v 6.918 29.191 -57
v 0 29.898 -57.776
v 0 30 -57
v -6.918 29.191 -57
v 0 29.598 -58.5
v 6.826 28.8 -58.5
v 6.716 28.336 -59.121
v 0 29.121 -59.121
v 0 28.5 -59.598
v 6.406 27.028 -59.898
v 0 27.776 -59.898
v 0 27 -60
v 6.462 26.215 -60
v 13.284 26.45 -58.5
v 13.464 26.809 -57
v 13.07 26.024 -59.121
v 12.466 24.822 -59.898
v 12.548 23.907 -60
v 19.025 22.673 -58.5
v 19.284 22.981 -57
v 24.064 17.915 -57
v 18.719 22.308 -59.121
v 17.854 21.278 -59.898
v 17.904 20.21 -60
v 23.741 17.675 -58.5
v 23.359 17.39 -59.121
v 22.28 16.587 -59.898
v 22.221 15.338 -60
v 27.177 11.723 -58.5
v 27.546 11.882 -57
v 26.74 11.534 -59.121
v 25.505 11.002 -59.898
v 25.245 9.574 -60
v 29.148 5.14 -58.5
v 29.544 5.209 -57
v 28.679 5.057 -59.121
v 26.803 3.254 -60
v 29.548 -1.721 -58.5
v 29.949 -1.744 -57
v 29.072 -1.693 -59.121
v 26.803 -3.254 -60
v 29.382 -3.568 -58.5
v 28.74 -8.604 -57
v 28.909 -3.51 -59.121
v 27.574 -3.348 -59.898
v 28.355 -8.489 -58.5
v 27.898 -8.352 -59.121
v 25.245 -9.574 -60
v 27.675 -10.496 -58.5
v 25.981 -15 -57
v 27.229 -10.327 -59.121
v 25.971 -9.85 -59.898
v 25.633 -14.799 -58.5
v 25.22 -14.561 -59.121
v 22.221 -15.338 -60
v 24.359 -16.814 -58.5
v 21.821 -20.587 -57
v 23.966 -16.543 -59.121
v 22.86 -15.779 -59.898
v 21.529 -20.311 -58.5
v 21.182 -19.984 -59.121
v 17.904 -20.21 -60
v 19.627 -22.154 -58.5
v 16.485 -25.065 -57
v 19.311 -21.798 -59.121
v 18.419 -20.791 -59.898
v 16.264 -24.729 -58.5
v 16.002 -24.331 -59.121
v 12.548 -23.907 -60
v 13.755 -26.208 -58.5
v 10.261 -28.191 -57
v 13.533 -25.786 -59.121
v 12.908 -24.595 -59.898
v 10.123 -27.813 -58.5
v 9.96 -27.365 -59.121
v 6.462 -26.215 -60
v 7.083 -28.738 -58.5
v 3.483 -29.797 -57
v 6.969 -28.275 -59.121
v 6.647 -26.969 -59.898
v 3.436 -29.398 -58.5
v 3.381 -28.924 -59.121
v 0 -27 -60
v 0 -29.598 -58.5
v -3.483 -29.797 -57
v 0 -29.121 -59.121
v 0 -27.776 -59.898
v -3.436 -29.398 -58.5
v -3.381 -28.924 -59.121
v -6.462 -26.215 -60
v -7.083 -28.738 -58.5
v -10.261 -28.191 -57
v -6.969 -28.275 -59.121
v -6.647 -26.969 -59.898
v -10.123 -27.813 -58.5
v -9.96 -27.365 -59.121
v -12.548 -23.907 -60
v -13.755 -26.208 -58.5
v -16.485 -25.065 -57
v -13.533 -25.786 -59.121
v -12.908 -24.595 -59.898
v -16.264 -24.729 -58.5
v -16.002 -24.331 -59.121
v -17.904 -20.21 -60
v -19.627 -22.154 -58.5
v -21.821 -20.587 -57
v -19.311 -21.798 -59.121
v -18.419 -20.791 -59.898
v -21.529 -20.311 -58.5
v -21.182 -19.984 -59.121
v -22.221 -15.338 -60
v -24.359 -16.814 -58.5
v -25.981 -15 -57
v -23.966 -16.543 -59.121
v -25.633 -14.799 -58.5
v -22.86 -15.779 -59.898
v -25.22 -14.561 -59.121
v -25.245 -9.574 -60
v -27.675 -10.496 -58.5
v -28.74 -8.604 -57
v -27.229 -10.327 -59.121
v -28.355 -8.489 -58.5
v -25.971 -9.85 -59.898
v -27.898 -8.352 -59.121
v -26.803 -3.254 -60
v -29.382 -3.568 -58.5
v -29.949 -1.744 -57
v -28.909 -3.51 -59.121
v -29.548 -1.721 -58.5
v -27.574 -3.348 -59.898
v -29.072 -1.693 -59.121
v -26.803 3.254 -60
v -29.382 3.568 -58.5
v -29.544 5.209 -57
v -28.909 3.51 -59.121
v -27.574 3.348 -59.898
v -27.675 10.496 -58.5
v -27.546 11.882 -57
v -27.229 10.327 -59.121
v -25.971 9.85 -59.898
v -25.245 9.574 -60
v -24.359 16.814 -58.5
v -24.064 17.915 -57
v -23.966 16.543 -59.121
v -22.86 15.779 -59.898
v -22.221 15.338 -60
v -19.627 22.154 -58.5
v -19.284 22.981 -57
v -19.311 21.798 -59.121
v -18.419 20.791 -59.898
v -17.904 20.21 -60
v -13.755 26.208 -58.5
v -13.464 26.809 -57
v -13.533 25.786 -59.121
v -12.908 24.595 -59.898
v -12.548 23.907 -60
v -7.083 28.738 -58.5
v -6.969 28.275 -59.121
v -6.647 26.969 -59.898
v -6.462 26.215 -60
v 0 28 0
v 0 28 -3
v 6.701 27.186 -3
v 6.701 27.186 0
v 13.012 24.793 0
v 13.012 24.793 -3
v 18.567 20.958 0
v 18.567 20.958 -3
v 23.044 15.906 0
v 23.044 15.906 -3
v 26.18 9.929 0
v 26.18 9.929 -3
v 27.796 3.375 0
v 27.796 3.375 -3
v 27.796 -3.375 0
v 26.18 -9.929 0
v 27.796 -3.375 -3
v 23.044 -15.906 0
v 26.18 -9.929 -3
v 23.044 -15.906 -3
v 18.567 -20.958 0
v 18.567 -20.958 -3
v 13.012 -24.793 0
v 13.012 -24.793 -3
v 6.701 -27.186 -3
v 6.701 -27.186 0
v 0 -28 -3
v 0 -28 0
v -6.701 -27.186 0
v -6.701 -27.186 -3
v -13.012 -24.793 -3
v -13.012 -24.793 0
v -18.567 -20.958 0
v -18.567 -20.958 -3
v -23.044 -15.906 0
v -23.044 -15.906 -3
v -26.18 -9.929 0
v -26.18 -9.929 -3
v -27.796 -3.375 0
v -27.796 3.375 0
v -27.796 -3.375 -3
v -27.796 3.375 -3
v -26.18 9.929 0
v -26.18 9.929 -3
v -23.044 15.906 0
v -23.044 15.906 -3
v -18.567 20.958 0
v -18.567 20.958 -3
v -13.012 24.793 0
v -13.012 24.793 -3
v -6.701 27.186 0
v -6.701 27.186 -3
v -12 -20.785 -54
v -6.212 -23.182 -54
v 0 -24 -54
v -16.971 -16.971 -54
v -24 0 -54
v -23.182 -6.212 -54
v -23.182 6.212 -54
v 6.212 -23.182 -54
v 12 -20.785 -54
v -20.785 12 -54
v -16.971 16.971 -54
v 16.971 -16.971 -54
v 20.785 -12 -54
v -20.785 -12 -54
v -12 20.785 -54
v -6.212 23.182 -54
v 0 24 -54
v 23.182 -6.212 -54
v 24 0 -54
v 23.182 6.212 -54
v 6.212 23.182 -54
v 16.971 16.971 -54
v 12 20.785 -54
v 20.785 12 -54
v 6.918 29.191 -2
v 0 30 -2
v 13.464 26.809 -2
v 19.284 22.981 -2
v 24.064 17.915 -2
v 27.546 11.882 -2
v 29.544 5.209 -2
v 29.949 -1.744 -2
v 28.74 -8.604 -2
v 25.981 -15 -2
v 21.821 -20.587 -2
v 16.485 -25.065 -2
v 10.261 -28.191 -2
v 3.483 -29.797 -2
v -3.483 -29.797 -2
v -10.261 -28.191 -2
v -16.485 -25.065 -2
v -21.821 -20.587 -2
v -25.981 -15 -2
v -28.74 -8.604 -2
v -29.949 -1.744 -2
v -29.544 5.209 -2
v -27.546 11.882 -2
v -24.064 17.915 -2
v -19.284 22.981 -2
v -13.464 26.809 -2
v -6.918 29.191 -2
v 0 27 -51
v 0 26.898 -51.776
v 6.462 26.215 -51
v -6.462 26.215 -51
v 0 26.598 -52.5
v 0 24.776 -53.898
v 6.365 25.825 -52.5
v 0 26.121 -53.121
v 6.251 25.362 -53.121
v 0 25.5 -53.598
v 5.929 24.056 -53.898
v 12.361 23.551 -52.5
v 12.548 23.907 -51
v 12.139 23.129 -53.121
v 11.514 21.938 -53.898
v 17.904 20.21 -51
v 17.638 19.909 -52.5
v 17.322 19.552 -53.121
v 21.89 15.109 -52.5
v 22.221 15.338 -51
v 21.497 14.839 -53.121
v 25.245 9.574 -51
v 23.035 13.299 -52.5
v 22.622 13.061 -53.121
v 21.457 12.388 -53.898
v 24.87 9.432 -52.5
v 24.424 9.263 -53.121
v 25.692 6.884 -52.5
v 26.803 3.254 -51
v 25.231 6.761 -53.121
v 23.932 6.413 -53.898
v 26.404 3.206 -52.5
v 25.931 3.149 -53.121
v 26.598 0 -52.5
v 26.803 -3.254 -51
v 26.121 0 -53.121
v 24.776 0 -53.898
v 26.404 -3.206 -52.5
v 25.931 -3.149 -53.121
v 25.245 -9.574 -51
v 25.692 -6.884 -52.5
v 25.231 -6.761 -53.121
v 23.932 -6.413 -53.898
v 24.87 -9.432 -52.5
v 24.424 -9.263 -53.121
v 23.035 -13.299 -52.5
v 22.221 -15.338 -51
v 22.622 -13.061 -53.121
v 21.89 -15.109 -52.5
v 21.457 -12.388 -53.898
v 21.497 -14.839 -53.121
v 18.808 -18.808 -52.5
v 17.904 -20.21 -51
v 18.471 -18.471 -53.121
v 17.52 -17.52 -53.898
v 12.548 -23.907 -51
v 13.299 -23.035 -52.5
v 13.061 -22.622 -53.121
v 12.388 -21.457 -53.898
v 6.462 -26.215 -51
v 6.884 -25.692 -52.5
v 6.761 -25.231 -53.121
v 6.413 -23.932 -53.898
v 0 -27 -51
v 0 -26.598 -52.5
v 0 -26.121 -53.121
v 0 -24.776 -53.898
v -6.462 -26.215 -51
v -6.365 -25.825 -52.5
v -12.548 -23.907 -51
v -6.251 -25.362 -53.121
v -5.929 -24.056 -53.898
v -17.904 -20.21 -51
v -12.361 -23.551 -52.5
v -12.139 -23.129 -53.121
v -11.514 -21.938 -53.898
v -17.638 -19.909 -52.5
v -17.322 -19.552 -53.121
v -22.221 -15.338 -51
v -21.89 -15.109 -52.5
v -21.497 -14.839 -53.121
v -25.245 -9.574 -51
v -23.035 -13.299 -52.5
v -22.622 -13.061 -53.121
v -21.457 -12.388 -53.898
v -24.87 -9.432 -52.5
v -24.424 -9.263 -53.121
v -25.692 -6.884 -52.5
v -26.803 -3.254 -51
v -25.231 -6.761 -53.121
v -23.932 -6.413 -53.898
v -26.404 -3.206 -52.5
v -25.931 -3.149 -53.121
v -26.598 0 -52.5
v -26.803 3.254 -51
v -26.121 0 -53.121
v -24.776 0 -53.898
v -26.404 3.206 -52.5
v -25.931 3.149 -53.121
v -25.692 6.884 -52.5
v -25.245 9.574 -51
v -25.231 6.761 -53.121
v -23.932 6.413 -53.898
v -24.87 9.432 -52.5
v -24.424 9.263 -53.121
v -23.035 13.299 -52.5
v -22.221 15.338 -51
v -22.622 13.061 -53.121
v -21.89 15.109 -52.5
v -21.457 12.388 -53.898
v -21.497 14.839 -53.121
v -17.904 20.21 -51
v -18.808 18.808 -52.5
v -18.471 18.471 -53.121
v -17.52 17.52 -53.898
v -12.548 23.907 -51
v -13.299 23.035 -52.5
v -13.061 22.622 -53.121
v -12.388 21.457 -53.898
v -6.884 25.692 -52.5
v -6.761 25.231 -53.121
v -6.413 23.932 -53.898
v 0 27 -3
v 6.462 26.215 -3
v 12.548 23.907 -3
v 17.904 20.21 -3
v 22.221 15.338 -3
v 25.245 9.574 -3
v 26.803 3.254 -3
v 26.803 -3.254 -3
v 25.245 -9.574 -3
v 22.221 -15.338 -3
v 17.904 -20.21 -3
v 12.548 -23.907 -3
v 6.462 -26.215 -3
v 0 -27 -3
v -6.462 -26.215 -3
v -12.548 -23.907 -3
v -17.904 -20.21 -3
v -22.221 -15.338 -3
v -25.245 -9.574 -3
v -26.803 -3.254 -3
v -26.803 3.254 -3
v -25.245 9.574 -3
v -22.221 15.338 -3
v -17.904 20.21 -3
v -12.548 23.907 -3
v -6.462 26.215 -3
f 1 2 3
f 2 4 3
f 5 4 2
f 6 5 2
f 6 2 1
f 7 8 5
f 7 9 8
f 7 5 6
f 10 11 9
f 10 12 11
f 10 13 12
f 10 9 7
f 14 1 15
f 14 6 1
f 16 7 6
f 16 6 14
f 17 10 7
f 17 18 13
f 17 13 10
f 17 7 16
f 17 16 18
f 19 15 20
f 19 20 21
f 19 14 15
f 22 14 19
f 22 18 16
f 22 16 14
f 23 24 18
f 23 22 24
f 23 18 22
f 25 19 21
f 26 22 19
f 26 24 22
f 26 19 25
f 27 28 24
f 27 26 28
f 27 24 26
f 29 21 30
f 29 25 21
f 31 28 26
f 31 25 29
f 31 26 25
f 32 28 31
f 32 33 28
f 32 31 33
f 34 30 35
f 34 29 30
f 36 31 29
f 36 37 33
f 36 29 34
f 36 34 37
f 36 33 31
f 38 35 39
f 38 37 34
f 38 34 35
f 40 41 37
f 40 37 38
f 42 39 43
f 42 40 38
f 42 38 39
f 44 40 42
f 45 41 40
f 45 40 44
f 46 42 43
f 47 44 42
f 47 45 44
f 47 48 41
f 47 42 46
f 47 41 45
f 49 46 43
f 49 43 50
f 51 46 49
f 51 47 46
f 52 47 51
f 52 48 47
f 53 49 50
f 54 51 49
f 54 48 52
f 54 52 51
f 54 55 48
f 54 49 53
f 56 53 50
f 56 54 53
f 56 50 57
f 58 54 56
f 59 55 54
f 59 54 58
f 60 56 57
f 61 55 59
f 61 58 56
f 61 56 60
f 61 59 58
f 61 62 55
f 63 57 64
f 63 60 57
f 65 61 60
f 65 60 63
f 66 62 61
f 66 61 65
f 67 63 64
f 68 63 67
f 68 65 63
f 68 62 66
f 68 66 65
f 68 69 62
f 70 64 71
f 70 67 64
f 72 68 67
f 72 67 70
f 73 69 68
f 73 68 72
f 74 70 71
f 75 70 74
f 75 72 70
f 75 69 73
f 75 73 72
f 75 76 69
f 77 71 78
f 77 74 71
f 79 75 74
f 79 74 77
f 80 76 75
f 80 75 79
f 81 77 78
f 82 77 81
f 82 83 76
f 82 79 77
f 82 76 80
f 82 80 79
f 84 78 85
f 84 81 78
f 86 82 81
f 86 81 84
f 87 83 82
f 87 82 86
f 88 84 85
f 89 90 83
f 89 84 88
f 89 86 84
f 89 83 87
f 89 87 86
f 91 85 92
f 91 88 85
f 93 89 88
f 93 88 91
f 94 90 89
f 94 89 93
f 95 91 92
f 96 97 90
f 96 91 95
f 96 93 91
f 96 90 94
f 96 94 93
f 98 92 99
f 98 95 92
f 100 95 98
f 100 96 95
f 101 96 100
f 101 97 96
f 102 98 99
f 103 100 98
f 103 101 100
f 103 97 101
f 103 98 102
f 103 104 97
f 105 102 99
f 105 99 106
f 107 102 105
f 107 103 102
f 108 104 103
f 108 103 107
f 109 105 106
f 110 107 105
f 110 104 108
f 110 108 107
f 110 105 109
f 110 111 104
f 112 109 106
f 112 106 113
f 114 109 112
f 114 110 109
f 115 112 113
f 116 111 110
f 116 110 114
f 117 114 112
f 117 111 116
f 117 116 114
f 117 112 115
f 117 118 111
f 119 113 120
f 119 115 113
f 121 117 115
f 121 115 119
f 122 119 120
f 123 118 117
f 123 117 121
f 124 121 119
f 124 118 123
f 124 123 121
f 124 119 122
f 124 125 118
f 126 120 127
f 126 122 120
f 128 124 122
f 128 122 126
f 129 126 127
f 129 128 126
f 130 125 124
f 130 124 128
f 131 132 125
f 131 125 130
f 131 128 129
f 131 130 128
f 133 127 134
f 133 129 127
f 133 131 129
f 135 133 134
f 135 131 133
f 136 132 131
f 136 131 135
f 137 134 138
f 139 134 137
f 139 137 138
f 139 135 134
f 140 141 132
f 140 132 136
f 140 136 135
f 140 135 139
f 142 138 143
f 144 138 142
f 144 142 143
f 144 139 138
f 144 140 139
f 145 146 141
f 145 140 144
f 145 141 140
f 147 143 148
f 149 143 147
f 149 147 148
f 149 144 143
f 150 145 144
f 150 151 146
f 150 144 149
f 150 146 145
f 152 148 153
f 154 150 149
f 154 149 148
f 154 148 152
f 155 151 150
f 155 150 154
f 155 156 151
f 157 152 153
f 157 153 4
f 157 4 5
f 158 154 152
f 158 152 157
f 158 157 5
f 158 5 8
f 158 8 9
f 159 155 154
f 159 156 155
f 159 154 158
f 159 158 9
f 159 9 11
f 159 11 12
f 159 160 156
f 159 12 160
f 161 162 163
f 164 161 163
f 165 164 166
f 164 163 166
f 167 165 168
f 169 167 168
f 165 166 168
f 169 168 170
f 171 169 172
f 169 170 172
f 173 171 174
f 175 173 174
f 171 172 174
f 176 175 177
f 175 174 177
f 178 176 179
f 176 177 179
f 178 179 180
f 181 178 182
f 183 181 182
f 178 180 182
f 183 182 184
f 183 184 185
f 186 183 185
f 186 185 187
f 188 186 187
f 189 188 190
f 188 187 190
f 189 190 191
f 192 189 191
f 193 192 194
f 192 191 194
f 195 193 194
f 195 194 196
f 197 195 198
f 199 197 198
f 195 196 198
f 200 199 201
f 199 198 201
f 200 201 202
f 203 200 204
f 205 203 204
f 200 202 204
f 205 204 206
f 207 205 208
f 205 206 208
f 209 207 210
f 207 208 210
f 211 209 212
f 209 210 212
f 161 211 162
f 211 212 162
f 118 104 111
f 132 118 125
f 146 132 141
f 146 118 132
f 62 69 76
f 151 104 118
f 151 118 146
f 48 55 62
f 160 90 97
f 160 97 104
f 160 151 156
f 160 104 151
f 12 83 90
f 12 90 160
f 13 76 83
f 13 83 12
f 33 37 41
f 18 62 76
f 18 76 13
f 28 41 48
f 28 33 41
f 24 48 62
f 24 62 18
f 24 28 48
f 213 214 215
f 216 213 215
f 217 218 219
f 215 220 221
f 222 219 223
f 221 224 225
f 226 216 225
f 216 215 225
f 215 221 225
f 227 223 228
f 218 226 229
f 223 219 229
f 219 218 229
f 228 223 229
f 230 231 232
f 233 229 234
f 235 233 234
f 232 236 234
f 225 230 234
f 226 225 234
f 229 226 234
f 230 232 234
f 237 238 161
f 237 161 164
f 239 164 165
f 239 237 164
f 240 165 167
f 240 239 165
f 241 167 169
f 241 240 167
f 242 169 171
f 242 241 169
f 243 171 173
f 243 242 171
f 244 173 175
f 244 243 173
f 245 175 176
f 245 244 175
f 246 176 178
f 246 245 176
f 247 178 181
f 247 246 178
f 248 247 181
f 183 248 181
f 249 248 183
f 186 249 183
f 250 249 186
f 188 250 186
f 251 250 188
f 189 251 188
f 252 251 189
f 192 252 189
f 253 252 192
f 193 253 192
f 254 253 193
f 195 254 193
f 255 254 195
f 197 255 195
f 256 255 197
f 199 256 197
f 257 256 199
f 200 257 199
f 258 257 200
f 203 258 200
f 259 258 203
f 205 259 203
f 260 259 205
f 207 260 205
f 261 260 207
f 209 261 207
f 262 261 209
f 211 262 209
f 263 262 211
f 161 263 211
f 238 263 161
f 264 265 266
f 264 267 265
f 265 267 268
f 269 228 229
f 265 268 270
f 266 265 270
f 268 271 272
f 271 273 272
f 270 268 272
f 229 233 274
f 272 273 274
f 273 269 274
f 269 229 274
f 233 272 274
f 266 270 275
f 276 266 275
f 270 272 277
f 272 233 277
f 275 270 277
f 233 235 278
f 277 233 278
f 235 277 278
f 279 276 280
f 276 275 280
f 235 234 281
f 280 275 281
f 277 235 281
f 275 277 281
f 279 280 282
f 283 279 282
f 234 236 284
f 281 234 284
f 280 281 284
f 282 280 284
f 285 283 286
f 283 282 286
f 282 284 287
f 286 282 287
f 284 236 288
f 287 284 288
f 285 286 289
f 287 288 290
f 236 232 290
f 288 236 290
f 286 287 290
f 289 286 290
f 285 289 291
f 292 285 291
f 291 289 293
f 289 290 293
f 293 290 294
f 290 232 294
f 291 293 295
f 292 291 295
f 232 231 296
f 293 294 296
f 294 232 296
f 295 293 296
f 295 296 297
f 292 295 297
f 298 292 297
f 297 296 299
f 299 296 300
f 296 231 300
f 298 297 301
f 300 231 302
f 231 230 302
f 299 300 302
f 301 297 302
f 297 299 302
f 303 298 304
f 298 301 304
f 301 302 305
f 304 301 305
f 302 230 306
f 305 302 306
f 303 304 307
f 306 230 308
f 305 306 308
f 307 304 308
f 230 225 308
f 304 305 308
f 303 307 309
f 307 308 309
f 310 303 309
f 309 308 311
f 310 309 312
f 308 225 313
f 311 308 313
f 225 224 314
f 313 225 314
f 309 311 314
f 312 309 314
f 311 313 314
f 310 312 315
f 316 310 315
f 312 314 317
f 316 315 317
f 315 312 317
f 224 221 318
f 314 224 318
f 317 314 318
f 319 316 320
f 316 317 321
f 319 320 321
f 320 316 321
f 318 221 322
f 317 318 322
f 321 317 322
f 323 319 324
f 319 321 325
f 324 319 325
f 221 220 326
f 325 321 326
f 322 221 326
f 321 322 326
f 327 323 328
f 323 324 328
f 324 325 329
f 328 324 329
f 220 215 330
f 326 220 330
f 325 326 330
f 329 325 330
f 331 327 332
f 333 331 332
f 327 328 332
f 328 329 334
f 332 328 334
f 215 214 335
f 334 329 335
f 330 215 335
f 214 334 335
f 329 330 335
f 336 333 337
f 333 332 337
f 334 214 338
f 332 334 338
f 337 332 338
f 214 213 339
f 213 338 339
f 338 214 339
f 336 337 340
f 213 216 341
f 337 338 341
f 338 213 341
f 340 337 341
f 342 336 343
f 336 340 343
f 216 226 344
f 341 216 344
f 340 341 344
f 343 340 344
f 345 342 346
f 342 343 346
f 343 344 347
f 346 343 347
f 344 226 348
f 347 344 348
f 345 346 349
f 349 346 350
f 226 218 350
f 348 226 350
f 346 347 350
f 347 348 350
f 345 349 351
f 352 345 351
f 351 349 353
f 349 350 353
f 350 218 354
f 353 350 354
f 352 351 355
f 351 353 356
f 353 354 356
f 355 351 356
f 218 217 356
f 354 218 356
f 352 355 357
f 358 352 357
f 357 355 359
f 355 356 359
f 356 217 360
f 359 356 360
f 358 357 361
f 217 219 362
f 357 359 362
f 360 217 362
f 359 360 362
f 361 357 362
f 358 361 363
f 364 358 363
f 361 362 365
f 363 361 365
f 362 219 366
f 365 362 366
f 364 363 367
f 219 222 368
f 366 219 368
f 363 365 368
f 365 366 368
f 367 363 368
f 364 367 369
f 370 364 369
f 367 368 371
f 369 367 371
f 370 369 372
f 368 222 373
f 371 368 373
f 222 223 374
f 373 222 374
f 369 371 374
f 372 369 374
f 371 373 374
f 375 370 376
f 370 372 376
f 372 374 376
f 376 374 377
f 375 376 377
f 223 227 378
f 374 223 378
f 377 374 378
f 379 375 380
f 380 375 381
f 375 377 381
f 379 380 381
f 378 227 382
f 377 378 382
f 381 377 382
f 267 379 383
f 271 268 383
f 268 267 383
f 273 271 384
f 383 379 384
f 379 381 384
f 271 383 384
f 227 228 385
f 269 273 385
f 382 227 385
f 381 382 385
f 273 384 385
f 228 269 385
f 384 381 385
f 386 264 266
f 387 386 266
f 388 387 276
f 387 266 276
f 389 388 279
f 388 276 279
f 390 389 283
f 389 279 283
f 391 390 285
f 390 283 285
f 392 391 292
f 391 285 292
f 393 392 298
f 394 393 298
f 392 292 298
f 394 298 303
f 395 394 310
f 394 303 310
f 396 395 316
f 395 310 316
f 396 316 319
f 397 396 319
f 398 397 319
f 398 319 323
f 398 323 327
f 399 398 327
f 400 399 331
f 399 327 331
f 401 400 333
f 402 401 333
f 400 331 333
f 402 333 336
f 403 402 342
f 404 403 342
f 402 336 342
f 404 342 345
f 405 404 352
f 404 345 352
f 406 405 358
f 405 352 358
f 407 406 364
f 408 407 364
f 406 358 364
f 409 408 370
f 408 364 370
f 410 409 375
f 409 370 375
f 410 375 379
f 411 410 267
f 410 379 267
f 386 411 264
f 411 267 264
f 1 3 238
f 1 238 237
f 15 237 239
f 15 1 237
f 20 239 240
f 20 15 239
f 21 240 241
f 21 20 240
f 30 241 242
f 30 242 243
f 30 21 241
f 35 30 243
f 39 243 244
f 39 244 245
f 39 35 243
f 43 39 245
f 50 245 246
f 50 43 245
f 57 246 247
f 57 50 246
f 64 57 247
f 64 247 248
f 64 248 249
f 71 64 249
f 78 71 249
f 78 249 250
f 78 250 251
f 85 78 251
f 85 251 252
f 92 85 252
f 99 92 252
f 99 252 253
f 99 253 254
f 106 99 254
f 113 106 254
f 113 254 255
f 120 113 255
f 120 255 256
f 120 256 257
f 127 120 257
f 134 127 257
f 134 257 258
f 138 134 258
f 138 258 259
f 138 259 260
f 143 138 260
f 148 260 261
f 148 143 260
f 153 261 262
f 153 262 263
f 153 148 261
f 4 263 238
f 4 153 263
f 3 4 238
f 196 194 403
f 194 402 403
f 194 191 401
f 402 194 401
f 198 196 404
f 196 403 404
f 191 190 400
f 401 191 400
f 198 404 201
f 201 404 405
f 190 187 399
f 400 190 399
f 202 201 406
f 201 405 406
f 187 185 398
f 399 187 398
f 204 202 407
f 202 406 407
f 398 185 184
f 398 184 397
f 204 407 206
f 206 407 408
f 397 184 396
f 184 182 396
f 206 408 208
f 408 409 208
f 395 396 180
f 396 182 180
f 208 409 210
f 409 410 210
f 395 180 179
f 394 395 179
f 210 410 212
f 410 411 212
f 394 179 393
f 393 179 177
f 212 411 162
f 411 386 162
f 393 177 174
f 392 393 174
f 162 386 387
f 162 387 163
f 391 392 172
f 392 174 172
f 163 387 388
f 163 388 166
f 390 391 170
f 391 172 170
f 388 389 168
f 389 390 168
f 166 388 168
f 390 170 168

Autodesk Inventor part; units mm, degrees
ref_plane "YZ Plane" through (0, 0, 0) normal (1, 0, 0) x (0, 1, 0)
ref_plane "XZ Plane" through (0, 0, 0) normal (0, 1, 0) x (-1, 0, 0)
ref_plane "XY Plane" through (0, 0, 0) normal (0, 0, 1) x (1, 0, 0)
sketch "Sketch2" plane through (0, 0, 0) normal (1, 0, 0) x (0, 1, 0)
  line L0 (0, 0) -> (30, 0)
  line L1 (30, 60) -> (30, -60)
  line L2 (30, 60) -> (27, 60)
  line L3 (27, 60) -> (27, -60)
  line L4 (27, -60) -> (30, -60)
  line L5 (27, 60) -> (0, 60)
  line L6 (0, 60) -> (5, 60)
  line L7 (5, 60) -> (5, 54)
  line L8 (5, 54) -> (27, 54)
  line L9 (27, -60) -> (0, -60)
  line L10 (0, -60) -> (5, -60)
  line L11 (5, -60) -> (5, -54)
  line L12 (5, -54) -> (27, -54)
  line L13 (0, 60) -> (0, -60)
  line L14 (27, 0) -> (28, 0)
  line L15 (28, 0) -> (28, -3)
  line L16 (28, -3) -> (27, -3)
  line L17 (28, 0) -> (28, 2)
  line L18 (28, 2) -> (30, 2)
  line L19 (30, 2) -> (28, 0)
  line L20 (28, 0) -> (28, -2)
  line L21 (28, -2) -> (30, -2)
  line L22 (30, -2) -> (28, 0)
  line L23 (5, -54) -> (0, -54)
  dimension "d12" = 30
  dimension "d13" = 120
  dimension "d14" = 3
  dimension "d15" = 5
  dimension "d16" = 6
  dimension "d17" = 6
  dimension "d26" = 1
  dimension "d27" = 3
  dimension "d28" = 2
  dimension "d29" = 2
revolve "Revolution1" add sketch "Sketch2" angle 360 about axis through (0, 0, 60) along (0, 0, -1) contours L23 L11 L9 L13 | L22 L21 L15 | L16 L15 L21 L1 L4 L3 | L12 L3 L9 L11
fillet "Fillet2" radius 3 1 edges at (0, -30, -60)
fillet "Fillet3" radius 3 1 edges at (0, -27, -54)
properties part number "Plenum"
